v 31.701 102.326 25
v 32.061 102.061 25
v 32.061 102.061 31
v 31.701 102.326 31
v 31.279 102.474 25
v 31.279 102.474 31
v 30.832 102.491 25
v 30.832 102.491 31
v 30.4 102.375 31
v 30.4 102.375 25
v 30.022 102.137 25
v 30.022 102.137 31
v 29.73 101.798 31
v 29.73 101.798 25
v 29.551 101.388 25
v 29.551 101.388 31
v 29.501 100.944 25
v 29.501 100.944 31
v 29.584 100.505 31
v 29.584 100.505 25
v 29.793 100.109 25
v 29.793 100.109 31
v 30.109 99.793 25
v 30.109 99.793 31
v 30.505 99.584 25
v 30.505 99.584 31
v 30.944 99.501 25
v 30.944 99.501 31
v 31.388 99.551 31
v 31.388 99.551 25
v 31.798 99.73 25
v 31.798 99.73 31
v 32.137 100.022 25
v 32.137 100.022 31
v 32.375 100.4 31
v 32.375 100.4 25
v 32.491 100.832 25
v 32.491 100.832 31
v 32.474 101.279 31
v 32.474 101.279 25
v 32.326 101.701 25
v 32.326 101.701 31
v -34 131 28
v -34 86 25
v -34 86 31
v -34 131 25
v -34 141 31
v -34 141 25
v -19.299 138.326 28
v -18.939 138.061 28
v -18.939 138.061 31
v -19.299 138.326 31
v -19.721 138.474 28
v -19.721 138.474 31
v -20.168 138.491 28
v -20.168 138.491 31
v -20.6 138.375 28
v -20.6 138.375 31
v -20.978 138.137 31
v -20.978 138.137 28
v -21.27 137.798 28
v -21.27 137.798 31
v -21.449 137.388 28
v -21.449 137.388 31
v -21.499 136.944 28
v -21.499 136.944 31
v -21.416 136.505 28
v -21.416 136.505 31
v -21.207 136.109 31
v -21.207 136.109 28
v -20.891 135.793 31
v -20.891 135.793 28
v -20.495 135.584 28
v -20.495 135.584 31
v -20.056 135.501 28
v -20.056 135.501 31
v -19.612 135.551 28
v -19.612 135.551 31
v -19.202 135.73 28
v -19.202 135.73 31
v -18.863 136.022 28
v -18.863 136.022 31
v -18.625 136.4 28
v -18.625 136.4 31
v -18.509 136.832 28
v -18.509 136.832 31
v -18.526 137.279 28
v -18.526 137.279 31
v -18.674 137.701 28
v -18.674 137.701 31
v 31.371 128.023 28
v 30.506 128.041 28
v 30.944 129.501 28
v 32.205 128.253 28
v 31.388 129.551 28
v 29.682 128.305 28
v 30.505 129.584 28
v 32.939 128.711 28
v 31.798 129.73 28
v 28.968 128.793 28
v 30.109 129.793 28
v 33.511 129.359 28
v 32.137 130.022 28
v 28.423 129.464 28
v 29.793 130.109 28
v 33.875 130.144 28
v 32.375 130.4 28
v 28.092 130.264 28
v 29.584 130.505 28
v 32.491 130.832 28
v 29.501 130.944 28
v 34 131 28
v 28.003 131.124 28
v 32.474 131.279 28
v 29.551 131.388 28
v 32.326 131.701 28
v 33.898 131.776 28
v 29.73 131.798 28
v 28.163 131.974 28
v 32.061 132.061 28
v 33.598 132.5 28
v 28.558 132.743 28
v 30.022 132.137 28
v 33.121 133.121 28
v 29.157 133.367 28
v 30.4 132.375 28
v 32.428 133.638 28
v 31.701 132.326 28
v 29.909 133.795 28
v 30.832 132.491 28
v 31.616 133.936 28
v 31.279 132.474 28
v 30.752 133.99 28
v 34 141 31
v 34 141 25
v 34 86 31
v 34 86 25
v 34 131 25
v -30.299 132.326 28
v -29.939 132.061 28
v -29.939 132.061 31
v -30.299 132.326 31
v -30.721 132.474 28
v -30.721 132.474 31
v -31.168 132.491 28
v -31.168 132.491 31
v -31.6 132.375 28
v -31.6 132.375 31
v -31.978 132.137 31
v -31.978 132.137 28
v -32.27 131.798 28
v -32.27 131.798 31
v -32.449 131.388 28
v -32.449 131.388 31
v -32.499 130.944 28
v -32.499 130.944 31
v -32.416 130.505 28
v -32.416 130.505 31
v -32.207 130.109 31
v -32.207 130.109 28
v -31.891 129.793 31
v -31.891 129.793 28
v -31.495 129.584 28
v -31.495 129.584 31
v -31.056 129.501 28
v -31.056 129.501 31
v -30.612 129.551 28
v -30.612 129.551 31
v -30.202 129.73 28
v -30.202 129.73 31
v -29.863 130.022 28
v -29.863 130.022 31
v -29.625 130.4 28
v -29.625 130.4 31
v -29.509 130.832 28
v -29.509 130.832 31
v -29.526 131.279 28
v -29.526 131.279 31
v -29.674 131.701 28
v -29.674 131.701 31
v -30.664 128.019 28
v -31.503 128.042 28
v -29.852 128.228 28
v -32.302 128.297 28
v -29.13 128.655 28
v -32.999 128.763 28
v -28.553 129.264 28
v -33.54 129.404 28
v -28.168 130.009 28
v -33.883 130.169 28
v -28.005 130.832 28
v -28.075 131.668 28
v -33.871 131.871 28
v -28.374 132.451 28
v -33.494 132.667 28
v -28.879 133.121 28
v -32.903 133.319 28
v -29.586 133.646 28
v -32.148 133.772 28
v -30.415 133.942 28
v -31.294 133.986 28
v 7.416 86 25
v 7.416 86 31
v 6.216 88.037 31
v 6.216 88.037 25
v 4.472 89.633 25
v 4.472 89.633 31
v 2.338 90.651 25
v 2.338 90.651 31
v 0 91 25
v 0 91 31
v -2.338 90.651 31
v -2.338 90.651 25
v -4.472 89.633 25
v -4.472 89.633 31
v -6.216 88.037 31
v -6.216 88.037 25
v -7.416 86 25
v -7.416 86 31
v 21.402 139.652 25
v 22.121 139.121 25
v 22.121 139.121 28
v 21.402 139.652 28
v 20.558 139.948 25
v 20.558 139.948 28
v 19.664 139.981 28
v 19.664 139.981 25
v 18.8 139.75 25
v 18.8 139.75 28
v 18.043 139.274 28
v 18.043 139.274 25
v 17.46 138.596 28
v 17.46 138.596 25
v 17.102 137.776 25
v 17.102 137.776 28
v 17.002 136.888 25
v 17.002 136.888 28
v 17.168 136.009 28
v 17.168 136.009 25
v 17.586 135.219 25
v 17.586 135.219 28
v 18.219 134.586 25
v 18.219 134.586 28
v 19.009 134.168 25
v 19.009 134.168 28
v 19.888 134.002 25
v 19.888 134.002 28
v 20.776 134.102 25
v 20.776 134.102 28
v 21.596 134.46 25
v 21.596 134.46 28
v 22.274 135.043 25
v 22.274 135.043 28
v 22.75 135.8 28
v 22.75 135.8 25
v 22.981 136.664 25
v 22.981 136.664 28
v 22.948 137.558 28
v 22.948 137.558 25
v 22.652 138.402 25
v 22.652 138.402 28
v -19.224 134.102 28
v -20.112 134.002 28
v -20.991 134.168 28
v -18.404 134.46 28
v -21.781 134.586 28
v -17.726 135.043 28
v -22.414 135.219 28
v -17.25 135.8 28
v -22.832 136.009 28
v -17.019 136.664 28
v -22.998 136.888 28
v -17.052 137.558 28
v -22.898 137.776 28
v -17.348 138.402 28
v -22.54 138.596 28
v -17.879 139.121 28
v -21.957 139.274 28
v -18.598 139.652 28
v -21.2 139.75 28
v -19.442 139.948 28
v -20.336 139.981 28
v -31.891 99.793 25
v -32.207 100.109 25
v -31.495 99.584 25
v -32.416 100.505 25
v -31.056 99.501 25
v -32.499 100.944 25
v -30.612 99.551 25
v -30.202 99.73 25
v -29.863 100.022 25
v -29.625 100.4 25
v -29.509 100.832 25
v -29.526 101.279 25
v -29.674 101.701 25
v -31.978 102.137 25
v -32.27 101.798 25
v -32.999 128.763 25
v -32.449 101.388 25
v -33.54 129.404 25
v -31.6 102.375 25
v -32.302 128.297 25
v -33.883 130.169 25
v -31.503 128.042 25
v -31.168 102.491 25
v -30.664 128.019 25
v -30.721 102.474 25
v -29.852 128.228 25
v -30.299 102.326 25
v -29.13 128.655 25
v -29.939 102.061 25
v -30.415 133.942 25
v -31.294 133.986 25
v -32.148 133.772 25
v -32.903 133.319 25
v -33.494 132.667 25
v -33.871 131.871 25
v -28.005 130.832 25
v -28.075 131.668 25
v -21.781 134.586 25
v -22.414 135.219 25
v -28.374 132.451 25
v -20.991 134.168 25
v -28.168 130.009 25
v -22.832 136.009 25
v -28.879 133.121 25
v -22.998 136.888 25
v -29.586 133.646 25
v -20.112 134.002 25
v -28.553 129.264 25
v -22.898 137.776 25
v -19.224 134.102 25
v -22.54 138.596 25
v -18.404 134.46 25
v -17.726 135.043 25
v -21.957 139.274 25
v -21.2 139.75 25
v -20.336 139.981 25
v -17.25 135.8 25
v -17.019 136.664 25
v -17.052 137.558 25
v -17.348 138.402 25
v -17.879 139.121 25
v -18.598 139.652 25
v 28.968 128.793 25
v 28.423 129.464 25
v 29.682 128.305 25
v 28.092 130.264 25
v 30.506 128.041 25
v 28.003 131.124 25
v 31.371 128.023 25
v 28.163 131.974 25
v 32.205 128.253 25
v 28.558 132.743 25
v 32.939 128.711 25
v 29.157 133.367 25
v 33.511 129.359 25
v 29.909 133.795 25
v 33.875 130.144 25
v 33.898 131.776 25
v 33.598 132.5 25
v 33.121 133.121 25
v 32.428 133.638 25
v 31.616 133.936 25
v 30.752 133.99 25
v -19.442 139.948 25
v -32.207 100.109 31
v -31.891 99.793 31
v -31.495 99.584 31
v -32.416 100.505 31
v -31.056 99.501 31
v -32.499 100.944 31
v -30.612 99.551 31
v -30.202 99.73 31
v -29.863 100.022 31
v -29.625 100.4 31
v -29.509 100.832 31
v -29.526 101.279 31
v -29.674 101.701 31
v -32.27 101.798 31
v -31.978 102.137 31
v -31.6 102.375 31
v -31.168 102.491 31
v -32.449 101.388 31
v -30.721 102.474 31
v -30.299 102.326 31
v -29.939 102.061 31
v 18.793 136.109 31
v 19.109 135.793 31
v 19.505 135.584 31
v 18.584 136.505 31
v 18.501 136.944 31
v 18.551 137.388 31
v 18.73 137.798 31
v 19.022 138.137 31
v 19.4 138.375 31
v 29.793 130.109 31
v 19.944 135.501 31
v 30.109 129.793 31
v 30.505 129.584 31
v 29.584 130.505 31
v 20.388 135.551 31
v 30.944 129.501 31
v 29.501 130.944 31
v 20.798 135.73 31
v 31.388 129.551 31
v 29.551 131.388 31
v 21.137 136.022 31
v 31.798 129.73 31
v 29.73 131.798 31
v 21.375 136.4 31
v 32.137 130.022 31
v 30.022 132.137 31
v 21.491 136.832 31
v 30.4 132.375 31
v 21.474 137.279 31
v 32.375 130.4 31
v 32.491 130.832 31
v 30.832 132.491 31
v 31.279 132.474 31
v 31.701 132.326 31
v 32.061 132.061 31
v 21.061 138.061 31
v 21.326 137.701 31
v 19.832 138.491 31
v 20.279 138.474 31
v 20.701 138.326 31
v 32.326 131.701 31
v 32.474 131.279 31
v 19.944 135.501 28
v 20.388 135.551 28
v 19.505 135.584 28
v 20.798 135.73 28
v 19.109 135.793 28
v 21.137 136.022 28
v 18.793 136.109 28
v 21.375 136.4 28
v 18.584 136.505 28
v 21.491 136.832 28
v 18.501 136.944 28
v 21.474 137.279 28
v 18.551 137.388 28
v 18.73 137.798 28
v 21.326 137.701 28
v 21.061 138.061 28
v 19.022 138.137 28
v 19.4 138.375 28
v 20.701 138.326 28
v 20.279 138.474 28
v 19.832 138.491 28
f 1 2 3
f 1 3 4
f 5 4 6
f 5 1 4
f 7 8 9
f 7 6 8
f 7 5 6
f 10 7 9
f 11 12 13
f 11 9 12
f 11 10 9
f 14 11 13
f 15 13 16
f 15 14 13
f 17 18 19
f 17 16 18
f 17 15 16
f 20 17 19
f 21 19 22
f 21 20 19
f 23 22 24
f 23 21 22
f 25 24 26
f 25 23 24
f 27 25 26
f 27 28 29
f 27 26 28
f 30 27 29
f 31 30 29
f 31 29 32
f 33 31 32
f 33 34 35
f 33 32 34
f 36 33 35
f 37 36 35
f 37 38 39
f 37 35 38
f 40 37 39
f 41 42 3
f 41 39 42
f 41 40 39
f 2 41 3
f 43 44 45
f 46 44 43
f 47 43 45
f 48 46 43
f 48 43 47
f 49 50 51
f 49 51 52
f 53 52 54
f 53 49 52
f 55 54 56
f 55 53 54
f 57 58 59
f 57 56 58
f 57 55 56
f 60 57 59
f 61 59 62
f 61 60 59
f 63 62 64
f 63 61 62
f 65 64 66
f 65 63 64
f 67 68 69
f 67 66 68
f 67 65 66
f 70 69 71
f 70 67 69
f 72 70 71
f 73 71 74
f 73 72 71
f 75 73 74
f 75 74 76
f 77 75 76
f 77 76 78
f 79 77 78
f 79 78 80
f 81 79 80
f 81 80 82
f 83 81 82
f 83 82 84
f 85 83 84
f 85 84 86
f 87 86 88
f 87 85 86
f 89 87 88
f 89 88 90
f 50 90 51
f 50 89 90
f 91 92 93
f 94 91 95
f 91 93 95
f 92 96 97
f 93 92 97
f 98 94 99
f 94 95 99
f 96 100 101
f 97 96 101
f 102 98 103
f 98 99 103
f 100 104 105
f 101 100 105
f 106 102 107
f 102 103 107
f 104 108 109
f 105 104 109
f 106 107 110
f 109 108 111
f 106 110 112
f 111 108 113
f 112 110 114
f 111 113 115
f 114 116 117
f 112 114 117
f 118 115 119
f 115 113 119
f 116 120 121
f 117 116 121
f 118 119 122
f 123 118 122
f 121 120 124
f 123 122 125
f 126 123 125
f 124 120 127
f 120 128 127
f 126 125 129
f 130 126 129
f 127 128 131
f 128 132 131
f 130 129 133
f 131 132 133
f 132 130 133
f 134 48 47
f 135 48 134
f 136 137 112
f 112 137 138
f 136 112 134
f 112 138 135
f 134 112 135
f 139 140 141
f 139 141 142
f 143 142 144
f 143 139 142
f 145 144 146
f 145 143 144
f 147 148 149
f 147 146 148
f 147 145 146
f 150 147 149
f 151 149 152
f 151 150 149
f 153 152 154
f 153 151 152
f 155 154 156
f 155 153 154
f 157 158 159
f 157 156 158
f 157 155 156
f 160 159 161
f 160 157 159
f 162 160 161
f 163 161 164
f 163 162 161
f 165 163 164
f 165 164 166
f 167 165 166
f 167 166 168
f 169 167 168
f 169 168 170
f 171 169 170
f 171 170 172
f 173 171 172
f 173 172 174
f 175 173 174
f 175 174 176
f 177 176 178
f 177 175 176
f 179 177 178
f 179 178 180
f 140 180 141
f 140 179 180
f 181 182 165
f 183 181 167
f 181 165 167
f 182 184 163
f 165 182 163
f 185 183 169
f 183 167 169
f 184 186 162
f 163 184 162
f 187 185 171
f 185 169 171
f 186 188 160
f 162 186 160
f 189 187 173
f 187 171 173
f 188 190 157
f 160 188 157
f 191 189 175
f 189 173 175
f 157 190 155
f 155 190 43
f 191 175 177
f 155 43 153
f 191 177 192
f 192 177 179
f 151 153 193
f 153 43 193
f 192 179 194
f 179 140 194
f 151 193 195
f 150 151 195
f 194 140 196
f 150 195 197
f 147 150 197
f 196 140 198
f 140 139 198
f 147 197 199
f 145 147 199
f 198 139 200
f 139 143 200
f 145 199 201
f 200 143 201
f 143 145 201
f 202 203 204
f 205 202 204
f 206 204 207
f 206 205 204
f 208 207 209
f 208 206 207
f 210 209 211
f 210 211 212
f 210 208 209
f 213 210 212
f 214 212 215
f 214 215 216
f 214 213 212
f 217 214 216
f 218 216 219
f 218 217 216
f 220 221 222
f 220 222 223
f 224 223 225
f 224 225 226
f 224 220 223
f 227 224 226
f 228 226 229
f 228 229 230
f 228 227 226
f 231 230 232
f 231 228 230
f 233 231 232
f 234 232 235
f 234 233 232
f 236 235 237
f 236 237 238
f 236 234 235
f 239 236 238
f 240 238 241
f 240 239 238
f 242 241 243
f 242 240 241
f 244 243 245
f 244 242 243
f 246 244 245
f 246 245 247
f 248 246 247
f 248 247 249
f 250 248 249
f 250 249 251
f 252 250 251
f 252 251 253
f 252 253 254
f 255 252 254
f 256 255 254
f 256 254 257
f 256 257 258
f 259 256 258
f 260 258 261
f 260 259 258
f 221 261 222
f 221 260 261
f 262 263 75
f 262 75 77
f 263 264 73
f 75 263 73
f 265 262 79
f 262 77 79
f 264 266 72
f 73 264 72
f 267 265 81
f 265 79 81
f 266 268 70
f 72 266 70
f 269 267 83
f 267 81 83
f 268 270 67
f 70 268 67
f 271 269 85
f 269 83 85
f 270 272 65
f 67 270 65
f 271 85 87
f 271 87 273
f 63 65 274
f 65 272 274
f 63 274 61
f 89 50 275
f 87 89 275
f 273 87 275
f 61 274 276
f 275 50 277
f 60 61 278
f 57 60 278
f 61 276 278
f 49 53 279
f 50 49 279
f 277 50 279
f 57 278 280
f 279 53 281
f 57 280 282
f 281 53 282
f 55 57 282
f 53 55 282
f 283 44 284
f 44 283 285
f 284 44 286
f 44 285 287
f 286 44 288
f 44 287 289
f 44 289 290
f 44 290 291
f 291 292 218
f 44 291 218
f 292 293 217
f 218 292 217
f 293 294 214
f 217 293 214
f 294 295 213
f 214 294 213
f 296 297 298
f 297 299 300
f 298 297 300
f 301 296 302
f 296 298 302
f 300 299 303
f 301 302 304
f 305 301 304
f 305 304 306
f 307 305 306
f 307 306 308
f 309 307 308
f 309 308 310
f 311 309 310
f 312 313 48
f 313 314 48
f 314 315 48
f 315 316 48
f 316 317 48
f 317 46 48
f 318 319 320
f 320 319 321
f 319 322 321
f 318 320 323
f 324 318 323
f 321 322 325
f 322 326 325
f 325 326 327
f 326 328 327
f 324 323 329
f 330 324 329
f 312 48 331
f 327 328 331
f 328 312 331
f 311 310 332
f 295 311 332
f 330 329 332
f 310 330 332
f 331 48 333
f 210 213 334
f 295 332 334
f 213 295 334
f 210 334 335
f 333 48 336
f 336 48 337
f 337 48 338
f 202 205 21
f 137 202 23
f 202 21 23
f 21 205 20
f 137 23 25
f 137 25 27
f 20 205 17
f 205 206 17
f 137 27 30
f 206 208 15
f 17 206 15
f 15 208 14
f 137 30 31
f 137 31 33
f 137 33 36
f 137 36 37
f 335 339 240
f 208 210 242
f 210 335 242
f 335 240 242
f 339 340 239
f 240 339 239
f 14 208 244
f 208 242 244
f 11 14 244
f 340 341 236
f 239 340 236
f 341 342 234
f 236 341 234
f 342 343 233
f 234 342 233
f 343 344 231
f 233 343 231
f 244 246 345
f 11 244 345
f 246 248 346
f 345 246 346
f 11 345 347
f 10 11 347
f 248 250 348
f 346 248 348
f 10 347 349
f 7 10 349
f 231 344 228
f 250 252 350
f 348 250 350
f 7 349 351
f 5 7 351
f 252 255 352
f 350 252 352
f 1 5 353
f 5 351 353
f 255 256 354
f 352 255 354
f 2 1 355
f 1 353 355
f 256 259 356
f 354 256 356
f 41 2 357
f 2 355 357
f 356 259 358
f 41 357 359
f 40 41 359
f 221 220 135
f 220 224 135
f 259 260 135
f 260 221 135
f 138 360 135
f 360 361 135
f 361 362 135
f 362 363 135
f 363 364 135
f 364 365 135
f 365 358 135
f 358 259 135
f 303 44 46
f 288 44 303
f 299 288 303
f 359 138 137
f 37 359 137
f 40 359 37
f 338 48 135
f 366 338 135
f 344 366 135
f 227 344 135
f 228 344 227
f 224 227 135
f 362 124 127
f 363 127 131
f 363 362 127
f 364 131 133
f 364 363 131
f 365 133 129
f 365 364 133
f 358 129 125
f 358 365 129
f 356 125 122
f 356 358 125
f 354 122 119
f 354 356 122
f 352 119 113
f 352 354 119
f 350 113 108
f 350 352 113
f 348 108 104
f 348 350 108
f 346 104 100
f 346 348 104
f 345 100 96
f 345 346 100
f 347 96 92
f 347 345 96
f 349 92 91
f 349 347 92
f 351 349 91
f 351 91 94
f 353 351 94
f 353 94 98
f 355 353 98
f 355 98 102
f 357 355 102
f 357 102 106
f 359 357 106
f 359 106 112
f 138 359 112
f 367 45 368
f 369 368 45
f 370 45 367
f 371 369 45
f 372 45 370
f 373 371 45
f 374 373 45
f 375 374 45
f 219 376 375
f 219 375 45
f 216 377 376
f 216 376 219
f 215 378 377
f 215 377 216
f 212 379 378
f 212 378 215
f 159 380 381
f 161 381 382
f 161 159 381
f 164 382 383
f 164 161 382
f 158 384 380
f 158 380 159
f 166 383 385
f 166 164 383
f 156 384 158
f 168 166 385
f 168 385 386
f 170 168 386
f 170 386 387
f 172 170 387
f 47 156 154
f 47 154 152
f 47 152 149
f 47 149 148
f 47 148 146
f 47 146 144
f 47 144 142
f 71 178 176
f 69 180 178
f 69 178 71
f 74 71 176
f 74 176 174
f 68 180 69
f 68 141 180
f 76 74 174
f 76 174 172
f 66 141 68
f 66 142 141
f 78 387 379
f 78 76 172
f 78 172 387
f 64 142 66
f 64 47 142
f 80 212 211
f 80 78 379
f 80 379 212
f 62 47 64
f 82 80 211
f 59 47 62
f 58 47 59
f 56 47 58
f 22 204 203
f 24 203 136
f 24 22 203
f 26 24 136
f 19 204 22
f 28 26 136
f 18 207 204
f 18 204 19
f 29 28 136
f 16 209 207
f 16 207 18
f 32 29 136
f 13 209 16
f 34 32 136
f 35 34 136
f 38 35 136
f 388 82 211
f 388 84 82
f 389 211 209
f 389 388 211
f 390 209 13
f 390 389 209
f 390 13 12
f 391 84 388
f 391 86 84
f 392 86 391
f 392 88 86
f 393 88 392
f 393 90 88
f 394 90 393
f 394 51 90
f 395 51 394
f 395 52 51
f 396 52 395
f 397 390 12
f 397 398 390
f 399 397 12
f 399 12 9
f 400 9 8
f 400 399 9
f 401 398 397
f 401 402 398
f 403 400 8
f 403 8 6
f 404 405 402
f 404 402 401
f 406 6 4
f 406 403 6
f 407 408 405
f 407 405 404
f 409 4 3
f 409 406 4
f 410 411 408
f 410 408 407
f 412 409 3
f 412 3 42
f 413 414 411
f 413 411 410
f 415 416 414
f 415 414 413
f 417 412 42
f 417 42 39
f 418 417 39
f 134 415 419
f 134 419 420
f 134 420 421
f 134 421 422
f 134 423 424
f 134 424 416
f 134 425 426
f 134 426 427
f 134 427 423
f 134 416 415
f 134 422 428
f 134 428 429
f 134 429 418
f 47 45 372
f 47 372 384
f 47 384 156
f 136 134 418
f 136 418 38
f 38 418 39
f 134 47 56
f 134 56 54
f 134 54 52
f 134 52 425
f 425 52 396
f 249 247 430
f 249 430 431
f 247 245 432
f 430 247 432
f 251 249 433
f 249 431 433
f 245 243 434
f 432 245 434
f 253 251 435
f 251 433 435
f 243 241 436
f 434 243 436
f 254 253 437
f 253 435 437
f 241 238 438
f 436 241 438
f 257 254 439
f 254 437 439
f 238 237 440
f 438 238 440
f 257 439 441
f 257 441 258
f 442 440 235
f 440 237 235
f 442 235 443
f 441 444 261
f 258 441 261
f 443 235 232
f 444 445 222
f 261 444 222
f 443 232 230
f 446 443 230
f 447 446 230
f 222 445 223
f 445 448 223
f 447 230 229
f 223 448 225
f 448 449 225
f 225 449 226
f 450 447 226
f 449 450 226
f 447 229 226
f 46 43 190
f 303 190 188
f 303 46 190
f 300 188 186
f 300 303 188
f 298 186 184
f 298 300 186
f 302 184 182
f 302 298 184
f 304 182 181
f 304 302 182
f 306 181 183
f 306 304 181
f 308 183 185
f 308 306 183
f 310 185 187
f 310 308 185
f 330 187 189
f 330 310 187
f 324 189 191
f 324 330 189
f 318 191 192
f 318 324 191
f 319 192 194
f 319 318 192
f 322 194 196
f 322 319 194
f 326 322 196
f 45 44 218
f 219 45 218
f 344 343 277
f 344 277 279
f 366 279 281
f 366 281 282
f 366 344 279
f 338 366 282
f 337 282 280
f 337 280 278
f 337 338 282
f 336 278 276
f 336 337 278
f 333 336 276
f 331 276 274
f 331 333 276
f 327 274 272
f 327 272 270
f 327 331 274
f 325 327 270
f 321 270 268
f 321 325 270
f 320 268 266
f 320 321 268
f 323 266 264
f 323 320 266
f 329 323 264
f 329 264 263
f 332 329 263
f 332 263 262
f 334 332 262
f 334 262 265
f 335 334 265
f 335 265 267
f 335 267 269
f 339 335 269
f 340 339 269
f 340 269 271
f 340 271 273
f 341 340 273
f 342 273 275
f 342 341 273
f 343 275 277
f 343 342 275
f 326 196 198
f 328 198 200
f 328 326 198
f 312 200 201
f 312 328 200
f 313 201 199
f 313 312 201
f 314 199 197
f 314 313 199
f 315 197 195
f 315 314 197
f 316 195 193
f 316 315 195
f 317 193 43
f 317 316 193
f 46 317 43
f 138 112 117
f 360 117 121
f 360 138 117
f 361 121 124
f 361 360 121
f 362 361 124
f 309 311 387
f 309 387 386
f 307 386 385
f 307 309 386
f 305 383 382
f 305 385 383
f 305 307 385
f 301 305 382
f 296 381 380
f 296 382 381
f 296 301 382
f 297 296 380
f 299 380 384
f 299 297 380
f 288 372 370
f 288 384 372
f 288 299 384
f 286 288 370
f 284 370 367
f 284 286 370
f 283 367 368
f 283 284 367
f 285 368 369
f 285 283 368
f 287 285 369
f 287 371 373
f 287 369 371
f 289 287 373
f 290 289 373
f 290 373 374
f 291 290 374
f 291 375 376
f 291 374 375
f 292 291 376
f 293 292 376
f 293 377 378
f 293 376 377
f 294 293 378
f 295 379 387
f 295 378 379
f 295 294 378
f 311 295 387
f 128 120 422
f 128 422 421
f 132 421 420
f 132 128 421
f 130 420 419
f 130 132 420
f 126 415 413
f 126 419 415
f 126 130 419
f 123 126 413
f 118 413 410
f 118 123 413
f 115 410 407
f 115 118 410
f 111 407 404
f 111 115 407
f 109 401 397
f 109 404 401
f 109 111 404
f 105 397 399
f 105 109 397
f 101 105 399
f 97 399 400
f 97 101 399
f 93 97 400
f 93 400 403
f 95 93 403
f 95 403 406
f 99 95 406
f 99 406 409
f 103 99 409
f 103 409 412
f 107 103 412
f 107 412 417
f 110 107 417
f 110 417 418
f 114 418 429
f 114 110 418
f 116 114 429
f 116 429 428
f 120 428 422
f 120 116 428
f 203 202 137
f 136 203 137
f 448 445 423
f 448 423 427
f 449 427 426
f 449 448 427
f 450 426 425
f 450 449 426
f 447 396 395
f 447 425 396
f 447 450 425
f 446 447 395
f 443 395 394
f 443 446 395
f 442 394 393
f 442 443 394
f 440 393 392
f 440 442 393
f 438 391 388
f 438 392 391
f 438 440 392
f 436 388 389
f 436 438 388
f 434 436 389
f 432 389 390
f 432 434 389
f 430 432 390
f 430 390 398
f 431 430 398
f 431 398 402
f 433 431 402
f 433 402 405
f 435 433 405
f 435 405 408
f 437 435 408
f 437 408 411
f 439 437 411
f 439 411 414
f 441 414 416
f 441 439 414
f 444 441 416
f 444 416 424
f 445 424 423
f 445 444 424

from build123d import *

# Parameters (mm, degrees)
CYLINDER2051_R               = 1.5
CYLINDER2051_DEPTH           = 50
CYLINDER2051_PLACEMENT_ANGLE = 45
CYLINDER2052_R               = 1.5
CYLINDER2052_DEPTH           = 50
CYLINDER2052_PLACEMENT_ANGLE = 45
CYLINDER2050_R               = 1.5
CYLINDER2050_DEPTH           = 50
CYLINDER2050_PLACEMENT_ANGLE = 45
CYLINDER2049_R               = 1.5
CYLINDER2049_DEPTH           = 50
CYLINDER2049_PLACEMENT_ANGLE = 45
CYLINDER2062_R               = 1.5
CYLINDER2062_DEPTH           = 50
CYLINDER2062_PLACEMENT_ANGLE = 45
CYLINDER2069_R               = 1.5
CYLINDER2069_DEPTH           = 50
CYLINDER2069_PLACEMENT_ANGLE = 45
CYLINDER2085_R               = 3
CYLINDER2085_DEPTH           = 3
CYLINDER2085_PLACEMENT_ANGLE = 45
CYLINDER2081_R               = 3
CYLINDER2081_DEPTH           = 3
CYLINDER2081_PLACEMENT_ANGLE = 45
CYLINDER2091_R               = 3
CYLINDER2091_DEPTH           = 3
CYLINDER2091_PLACEMENT_ANGLE = 45
CYLINDER2067_R               = 3
CYLINDER2067_DEPTH           = 3
CYLINDER2067_PLACEMENT_ANGLE = 45
CYLINDER2080_R               = 3
CYLINDER2080_DEPTH           = 3
CYLINDER2080_PLACEMENT_ANGLE = 45
CYLINDER2088_R               = 3
CYLINDER2088_DEPTH           = 3
CYLINDER2088_PLACEMENT_ANGLE = 45
CYLINDER2061_R               = 8
CYLINDER2061_DEPTH           = 6
BOX802_W                     = 68
BOX802_H                     = 55
BOX802_DEPTH                 = 6


with BuildPart() as v_lec2051:
    # Cylinder2051 → Cylinder2051 (new body)
    with BuildSketch(Plane.XY):
        Circle(CYLINDER2051_R)
    extrude(amount=CYLINDER2051_DEPTH)


with BuildPart() as v_lec2051_1:
    # Cylinder2051 placement: moved
    add(v_lec2051.part.moved(Location((20, 137, 0))).rotate(Axis((20, 137, 0), (0, 0, 1)), CYLINDER2051_PLACEMENT_ANGLE))


with BuildPart() as compound961:
    # Cylinder2052 → Cylinder2052 (new body)
    with BuildSketch(Plane.XY):
        Circle(CYLINDER2052_R)
    extrude(amount=CYLINDER2052_DEPTH)


with BuildPart() as compound961_1:
    # Cylinder2052 placement: moved
    add(compound961.part.moved(Location((-20, 137, 0))).rotate(Axis((-20, 137, 0), (0, 0, 1)), CYLINDER2052_PLACEMENT_ANGLE))

    # Compound961: union Válec2051
    add(v_lec2051_1.part)


with BuildPart() as v_lec2050:
    # Cylinder2050 → Cylinder2050 (new body)
    with BuildSketch(Plane.XY):
        Circle(CYLINDER2050_R)
    extrude(amount=CYLINDER2050_DEPTH)


with BuildPart() as v_lec2050_1:
    # Cylinder2050 placement: moved
    add(v_lec2050.part.moved(Location((31, 131, 0))).rotate(Axis((31, 131, 0), (0, 0, 1)), CYLINDER2050_PLACEMENT_ANGLE))


with BuildPart() as compound964:
    # Cylinder2049 → Cylinder2049 (new body)
    with BuildSketch(Plane.XY):
        Circle(CYLINDER2049_R)
    extrude(amount=CYLINDER2049_DEPTH)


with BuildPart() as compound964_1:
    # Cylinder2049 placement: moved
    add(compound964.part.moved(Location((-31, 131, 0))).rotate(Axis((-31, 131, 0), (0, 0, 1)), CYLINDER2049_PLACEMENT_ANGLE))

    # Compound964: union Válec2050
    add(v_lec2050_1.part)


with BuildPart() as v_lec2062:
    # Cylinder2062 → Cylinder2062 (new body)
    with BuildSketch(Plane.XY):
        Circle(CYLINDER2062_R)
    extrude(amount=CYLINDER2062_DEPTH)


with BuildPart() as v_lec2062_1:
    # Cylinder2062 placement: moved
    add(v_lec2062.part.moved(Location((31, 101, 0))).rotate(Axis((31, 101, 0), (0, 0, 1)), CYLINDER2062_PLACEMENT_ANGLE))


with BuildPart() as compound1109:
    # Cylinder2069 → Cylinder2069 (new body)
    with BuildSketch(Plane.XY):
        Circle(CYLINDER2069_R)
    extrude(amount=CYLINDER2069_DEPTH)


with BuildPart() as compound1109_1:
    # Cylinder2069 placement: moved
    add(compound1109.part.moved(Location((-31, 101, 0))).rotate(Axis((-31, 101, 0), (0, 0, 1)), CYLINDER2069_PLACEMENT_ANGLE))

    # Compound1090: union Válec2062
    add(v_lec2062_1.part)

    # Compound1109: union Compound961, Compound964
    add(compound961_1.part)
    add(compound964_1.part)


with BuildPart() as v_lec2085:
    # Cylinder2085 → Cylinder2085 (new body)
    with BuildSketch(Plane.XY):
        Circle(CYLINDER2085_R)
    extrude(amount=CYLINDER2085_DEPTH)


with BuildPart() as v_lec2085_1:
    # Cylinder2085 placement: moved
    add(v_lec2085.part.moved(Location((31, 131, 0))).rotate(Axis((31, 131, 0), (0, 0, 1)), CYLINDER2085_PLACEMENT_ANGLE))


with BuildPart() as compound1101:
    # Cylinder2081 → Cylinder2081 (new body)
    with BuildSketch(Plane.XY):
        Circle(CYLINDER2081_R)
    extrude(amount=CYLINDER2081_DEPTH)


with BuildPart() as compound1101_1:
    # Cylinder2081 placement: moved
    add(compound1101.part.moved(Location((-31, 131, 0))).rotate(Axis((-31, 131, 0), (0, 0, 1)), CYLINDER2081_PLACEMENT_ANGLE))

    # Compound1101: union Válec2085
    add(v_lec2085_1.part)


with BuildPart() as compound1101_2:
    # Compound1101 placement: moved
    add(compound1101_1.part.moved(Location((0, 0, 25))))


with BuildPart() as v_lec2091:
    # Cylinder2091 → Cylinder2091 (new body)
    with BuildSketch(Plane.XY):
        Circle(CYLINDER2091_R)
    extrude(amount=CYLINDER2091_DEPTH)


with BuildPart() as v_lec2091_1:
    # Cylinder2091 placement: moved
    add(v_lec2091.part.moved(Location((31, 101, 0))).rotate(Axis((31, 101, 0), (0, 0, 1)), CYLINDER2091_PLACEMENT_ANGLE))


with BuildPart() as compound1103:
    # Cylinder2067 → Cylinder2067 (new body)
    with BuildSketch(Plane.XY):
        Circle(CYLINDER2067_R)
    extrude(amount=CYLINDER2067_DEPTH)


with BuildPart() as compound1103_1:
    # Cylinder2067 placement: moved
    add(compound1103.part.moved(Location((-31, 101, 0))).rotate(Axis((-31, 101, 0), (0, 0, 1)), CYLINDER2067_PLACEMENT_ANGLE))

    # Compound1103: union Válec2091
    add(v_lec2091_1.part)


with BuildPart() as compound1103_2:
    # Compound1103 placement: moved
    add(compound1103_1.part.moved(Location((0, 0, 21))))


with BuildPart() as v_lec2080:
    # Cylinder2080 → Cylinder2080 (new body)
    with BuildSketch(Plane.XY):
        Circle(CYLINDER2080_R)
    extrude(amount=CYLINDER2080_DEPTH)


with BuildPart() as v_lec2080_1:
    # Cylinder2080 placement: moved
    add(v_lec2080.part.moved(Location((20, 137, 0))).rotate(Axis((20, 137, 0), (0, 0, 1)), CYLINDER2080_PLACEMENT_ANGLE))


with BuildPart() as compound1106:
    # Cylinder2088 → Cylinder2088 (new body)
    with BuildSketch(Plane.XY):
        Circle(CYLINDER2088_R)
    extrude(amount=CYLINDER2088_DEPTH)


with BuildPart() as compound1106_1:
    # Cylinder2088 placement: moved
    add(compound1106.part.moved(Location((-20, 137, 0))).rotate(Axis((-20, 137, 0), (0, 0, 1)), CYLINDER2088_PLACEMENT_ANGLE))

    # Compound1104: union Válec2080
    add(v_lec2080_1.part)


with BuildPart() as compound1106_2:
    # Compound1104 placement: moved
    add(compound1106_1.part.moved(Location((0, 0, 25))))

    # Compound1106: union Compound1101, Compound1103
    add(compound1101_2.part)
    add(compound1103_2.part)


with BuildPart() as v_lec2061:
    # Cylinder2061 → Cylinder2061 (new body)
    with BuildSketch(Plane(origin=(0, 83, 25), x_dir=(1, 0, 0), z_dir=(0, 0, 1))):
        Circle(CYLINDER2061_R)
    extrude(amount=CYLINDER2061_DEPTH)


with BuildPart() as cut698:
    # Box802 → Box802 (new body)
    with BuildSketch(Plane(origin=(-34, 86, 25), x_dir=(1, 0, 0), z_dir=(0, 0, 1))):
        with Locations((34, 27.5)):
            Rectangle(BOX802_W, BOX802_H)
    extrude(amount=BOX802_DEPTH)

    # Cut692: cut Válec2061
    add(v_lec2061.part, mode=Mode.SUBTRACT)

    # Cut696: cut Compound1106
    add(compound1106_2.part, mode=Mode.SUBTRACT)

    # Cut698: cut Compound1109
    add(compound1109_1.part, mode=Mode.SUBTRACT)


solid = cut698.part
